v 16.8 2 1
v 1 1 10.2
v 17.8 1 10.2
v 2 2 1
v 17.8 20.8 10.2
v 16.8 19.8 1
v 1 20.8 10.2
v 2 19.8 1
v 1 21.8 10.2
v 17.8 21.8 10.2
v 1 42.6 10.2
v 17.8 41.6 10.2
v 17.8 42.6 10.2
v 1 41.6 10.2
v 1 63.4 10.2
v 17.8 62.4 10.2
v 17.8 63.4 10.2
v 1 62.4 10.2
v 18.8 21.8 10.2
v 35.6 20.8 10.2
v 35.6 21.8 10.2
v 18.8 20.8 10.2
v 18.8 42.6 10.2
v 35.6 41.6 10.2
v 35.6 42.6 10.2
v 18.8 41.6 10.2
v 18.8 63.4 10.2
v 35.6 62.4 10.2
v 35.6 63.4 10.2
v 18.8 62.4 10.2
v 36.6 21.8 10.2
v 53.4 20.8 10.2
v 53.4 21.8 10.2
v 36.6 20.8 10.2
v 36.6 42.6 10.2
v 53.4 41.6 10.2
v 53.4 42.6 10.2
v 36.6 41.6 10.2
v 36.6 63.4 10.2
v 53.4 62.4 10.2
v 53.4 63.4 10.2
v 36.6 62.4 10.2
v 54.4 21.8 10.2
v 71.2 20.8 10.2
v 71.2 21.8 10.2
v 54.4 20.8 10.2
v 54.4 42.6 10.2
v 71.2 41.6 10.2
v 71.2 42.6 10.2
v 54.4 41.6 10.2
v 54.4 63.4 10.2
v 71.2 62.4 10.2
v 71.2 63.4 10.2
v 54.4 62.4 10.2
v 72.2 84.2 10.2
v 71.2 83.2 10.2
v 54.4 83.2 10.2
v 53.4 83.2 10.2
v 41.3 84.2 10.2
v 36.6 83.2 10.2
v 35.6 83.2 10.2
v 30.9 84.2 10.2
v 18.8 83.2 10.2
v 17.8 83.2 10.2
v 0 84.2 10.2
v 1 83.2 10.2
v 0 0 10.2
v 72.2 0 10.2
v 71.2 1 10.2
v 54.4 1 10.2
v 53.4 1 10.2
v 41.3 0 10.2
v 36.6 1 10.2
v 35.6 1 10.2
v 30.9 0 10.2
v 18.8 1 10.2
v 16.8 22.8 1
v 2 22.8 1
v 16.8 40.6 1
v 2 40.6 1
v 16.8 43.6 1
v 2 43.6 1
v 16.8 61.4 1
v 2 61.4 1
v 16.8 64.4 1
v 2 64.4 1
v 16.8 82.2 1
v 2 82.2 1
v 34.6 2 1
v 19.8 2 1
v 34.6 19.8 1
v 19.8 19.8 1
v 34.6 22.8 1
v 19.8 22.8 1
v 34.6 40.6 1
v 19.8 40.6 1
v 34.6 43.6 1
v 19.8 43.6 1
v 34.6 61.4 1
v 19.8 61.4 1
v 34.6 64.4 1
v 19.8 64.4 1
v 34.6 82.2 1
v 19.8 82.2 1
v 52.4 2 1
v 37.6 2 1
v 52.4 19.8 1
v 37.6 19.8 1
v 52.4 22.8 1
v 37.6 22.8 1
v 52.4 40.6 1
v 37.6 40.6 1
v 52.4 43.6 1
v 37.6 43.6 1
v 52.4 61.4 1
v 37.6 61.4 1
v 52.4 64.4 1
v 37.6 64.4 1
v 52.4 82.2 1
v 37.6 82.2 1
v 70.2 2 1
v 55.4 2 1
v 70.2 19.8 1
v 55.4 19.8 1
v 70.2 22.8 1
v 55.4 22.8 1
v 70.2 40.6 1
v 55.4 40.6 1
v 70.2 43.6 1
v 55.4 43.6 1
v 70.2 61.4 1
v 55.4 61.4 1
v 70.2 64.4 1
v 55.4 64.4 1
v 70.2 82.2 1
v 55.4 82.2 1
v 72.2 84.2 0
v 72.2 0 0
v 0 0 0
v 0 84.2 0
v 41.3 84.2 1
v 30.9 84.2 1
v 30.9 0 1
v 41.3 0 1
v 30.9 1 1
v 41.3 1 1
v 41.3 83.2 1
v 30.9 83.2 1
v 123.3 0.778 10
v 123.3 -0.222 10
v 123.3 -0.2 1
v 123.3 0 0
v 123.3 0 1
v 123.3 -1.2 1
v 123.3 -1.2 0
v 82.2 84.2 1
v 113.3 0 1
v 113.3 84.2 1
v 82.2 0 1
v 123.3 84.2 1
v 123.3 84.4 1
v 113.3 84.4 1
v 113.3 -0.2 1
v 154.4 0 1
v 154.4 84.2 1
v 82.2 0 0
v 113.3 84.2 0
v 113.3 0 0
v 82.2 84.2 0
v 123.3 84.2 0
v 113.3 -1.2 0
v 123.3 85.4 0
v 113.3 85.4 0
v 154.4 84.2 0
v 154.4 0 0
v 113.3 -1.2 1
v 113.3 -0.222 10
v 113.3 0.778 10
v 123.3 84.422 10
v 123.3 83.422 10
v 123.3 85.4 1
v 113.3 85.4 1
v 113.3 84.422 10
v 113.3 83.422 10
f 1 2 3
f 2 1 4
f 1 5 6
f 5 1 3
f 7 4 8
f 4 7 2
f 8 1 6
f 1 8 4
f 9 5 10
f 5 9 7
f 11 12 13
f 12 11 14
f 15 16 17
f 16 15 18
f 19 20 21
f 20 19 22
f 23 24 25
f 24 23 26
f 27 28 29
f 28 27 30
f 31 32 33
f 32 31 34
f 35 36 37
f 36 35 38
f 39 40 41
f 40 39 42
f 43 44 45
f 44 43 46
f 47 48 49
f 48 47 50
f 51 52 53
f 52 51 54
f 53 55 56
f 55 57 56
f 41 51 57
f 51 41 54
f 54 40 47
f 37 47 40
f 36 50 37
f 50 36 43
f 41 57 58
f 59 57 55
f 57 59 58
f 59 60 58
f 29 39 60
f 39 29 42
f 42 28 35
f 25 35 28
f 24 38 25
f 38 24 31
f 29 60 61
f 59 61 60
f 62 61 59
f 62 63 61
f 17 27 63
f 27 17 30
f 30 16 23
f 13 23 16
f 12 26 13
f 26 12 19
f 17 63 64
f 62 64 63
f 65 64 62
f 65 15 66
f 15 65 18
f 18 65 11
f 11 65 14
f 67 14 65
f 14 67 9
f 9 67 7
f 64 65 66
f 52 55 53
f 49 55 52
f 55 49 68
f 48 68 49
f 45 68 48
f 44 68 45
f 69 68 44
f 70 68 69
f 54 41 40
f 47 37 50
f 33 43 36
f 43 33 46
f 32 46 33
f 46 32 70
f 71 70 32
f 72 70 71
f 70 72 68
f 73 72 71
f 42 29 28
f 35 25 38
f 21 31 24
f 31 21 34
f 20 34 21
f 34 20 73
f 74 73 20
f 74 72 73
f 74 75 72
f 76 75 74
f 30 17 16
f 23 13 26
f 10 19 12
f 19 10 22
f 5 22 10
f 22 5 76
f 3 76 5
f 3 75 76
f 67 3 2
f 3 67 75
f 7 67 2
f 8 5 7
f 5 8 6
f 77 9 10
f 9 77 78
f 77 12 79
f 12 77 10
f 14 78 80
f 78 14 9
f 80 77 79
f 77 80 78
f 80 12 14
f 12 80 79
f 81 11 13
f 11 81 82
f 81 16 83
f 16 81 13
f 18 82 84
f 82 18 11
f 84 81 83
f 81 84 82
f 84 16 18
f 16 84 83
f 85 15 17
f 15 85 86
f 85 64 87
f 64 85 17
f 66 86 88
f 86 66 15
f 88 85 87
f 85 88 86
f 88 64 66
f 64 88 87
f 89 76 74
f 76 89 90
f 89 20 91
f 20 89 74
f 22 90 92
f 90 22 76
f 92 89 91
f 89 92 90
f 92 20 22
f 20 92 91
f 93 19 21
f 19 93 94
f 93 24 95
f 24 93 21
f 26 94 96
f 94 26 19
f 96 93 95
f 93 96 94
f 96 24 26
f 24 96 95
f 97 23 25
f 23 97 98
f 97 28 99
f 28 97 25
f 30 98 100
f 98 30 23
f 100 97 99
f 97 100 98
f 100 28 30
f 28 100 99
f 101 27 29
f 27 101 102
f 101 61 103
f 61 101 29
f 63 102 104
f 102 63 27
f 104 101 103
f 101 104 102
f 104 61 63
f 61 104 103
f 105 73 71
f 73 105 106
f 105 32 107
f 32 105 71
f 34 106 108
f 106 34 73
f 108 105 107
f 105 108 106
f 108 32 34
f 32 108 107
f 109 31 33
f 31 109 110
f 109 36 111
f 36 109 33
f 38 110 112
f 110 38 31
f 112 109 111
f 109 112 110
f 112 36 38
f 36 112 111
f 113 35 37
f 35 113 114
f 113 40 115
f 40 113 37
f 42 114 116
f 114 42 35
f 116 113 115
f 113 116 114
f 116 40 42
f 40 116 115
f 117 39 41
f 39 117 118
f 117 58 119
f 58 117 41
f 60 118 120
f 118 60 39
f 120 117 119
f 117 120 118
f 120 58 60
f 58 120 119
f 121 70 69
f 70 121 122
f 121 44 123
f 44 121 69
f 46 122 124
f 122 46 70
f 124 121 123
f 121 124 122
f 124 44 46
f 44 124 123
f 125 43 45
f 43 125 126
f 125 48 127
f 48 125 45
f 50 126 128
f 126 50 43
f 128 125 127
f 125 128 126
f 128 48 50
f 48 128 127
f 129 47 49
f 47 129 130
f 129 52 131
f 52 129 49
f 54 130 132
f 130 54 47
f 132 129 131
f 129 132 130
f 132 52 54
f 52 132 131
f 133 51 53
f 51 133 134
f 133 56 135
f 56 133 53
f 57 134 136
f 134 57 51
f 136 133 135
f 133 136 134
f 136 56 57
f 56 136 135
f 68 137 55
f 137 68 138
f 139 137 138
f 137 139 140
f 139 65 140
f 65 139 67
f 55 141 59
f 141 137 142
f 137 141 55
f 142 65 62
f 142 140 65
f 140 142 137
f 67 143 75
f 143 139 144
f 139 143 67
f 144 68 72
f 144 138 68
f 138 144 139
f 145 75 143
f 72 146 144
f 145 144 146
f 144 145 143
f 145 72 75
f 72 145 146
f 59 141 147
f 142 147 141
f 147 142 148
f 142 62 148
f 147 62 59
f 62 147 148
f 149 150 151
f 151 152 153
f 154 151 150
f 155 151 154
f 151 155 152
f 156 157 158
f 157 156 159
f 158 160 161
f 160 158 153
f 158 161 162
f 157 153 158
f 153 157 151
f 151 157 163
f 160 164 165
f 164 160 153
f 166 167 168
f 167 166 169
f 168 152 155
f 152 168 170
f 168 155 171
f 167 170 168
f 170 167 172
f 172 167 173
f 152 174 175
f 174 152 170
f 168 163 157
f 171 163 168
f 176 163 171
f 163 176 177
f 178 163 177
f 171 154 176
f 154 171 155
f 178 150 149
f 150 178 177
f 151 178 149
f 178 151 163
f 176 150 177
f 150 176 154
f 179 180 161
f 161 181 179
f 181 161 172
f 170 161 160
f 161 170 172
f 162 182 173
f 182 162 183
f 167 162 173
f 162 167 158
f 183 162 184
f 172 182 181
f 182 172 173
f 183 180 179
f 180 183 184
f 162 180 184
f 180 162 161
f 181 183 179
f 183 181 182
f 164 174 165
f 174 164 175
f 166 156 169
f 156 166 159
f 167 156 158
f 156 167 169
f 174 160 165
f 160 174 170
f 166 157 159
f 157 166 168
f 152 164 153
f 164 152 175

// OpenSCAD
//Settings.
play = 0.2;
num_width = 4;
num_length = 4;
thickness = 1;
clip_width = 10 + play * 2;
clip_depth = 1;
//Measurements.
top_width = 16.4 + play * 2;
top_length = 19.4 + play * 2;
bottom_width = 14.4 + play * 2;
bottom_length = 17.4 + play * 2;
height = 9 + play;

module slot() {
	position = (top_width - bottom_width) / 2;
	translate([position, position, 0]) {
		minkowski() {
			scale([1, 1, 0]) {
				cube([bottom_width, bottom_length, 1]);
			}
			rotate([0, 0, 45]) {
				cylinder(h=height, r1=0, r2=position * sqrt(2), $fn=4);
			}
		}
	}
}

//Main body.
total_width = top_width * num_width + thickness * (num_width + 1);
total_length = top_length * num_length + thickness * (num_length + 1);
difference() {
	cube([total_width, total_length, height + thickness]);
	for(x = [thickness : thickness + top_width : total_width]) {
		for(y = [thickness : thickness + top_length : total_length]) {
			translate([x, y, thickness]) {
				slot();
			}
		}
	}
	translate([total_width / 2 - clip_width / 2, -10, thickness]) {
		multmatrix([[1, 0, 0, 0], [0, 1, -clip_depth / height, 0], [0, 0, 1, 0], [0, 0, 0, 1]]) {
			cube([clip_width, 10 + clip_depth, height]);
		}
	}
	translate([total_width / 2 - clip_width / 2, total_length - clip_depth, thickness]) {
		multmatrix([[1, 0, 0, 0], [0, 1, clip_depth / height, 0], [0, 0, 1, 0], [0, 0, 0, 1]]) {
			cube([clip_width, 10 + clip_depth, height]);
		}
	}
}

//Lid.
translate([total_width + 10, 0, 0]) {
	cube([total_width, total_length, thickness]);
	translate([total_width / 2 - clip_width / 2 + play, -thickness - play, 0]) {
		cube([clip_width - play * 2, thickness + play + 1, thickness]);
		translate([0, 0, thickness]) {
			multmatrix([[1, 0, 0, 0], [0, 1, clip_depth / height, 0], [0, 0, 1, 0], [0, 0, 0, 1]]) {
				cube([clip_width - play * 2, thickness, height - play]);
			}
		}
	}
	translate([total_width / 2 - clip_width / 2 + play, total_length - 1, 0]) {
		cube([clip_width - play * 2, thickness + play + 1, thickness]);
		translate([0, play + 1, thickness]) {
			multmatrix([[1, 0, 0, 0], [0, 1, -clip_depth / height, 0], [0, 0, 1, 0], [0, 0, 0, 1]]) {
				cube([clip_width - play * 2, thickness, height - play]);
			}
		}
	}
}
